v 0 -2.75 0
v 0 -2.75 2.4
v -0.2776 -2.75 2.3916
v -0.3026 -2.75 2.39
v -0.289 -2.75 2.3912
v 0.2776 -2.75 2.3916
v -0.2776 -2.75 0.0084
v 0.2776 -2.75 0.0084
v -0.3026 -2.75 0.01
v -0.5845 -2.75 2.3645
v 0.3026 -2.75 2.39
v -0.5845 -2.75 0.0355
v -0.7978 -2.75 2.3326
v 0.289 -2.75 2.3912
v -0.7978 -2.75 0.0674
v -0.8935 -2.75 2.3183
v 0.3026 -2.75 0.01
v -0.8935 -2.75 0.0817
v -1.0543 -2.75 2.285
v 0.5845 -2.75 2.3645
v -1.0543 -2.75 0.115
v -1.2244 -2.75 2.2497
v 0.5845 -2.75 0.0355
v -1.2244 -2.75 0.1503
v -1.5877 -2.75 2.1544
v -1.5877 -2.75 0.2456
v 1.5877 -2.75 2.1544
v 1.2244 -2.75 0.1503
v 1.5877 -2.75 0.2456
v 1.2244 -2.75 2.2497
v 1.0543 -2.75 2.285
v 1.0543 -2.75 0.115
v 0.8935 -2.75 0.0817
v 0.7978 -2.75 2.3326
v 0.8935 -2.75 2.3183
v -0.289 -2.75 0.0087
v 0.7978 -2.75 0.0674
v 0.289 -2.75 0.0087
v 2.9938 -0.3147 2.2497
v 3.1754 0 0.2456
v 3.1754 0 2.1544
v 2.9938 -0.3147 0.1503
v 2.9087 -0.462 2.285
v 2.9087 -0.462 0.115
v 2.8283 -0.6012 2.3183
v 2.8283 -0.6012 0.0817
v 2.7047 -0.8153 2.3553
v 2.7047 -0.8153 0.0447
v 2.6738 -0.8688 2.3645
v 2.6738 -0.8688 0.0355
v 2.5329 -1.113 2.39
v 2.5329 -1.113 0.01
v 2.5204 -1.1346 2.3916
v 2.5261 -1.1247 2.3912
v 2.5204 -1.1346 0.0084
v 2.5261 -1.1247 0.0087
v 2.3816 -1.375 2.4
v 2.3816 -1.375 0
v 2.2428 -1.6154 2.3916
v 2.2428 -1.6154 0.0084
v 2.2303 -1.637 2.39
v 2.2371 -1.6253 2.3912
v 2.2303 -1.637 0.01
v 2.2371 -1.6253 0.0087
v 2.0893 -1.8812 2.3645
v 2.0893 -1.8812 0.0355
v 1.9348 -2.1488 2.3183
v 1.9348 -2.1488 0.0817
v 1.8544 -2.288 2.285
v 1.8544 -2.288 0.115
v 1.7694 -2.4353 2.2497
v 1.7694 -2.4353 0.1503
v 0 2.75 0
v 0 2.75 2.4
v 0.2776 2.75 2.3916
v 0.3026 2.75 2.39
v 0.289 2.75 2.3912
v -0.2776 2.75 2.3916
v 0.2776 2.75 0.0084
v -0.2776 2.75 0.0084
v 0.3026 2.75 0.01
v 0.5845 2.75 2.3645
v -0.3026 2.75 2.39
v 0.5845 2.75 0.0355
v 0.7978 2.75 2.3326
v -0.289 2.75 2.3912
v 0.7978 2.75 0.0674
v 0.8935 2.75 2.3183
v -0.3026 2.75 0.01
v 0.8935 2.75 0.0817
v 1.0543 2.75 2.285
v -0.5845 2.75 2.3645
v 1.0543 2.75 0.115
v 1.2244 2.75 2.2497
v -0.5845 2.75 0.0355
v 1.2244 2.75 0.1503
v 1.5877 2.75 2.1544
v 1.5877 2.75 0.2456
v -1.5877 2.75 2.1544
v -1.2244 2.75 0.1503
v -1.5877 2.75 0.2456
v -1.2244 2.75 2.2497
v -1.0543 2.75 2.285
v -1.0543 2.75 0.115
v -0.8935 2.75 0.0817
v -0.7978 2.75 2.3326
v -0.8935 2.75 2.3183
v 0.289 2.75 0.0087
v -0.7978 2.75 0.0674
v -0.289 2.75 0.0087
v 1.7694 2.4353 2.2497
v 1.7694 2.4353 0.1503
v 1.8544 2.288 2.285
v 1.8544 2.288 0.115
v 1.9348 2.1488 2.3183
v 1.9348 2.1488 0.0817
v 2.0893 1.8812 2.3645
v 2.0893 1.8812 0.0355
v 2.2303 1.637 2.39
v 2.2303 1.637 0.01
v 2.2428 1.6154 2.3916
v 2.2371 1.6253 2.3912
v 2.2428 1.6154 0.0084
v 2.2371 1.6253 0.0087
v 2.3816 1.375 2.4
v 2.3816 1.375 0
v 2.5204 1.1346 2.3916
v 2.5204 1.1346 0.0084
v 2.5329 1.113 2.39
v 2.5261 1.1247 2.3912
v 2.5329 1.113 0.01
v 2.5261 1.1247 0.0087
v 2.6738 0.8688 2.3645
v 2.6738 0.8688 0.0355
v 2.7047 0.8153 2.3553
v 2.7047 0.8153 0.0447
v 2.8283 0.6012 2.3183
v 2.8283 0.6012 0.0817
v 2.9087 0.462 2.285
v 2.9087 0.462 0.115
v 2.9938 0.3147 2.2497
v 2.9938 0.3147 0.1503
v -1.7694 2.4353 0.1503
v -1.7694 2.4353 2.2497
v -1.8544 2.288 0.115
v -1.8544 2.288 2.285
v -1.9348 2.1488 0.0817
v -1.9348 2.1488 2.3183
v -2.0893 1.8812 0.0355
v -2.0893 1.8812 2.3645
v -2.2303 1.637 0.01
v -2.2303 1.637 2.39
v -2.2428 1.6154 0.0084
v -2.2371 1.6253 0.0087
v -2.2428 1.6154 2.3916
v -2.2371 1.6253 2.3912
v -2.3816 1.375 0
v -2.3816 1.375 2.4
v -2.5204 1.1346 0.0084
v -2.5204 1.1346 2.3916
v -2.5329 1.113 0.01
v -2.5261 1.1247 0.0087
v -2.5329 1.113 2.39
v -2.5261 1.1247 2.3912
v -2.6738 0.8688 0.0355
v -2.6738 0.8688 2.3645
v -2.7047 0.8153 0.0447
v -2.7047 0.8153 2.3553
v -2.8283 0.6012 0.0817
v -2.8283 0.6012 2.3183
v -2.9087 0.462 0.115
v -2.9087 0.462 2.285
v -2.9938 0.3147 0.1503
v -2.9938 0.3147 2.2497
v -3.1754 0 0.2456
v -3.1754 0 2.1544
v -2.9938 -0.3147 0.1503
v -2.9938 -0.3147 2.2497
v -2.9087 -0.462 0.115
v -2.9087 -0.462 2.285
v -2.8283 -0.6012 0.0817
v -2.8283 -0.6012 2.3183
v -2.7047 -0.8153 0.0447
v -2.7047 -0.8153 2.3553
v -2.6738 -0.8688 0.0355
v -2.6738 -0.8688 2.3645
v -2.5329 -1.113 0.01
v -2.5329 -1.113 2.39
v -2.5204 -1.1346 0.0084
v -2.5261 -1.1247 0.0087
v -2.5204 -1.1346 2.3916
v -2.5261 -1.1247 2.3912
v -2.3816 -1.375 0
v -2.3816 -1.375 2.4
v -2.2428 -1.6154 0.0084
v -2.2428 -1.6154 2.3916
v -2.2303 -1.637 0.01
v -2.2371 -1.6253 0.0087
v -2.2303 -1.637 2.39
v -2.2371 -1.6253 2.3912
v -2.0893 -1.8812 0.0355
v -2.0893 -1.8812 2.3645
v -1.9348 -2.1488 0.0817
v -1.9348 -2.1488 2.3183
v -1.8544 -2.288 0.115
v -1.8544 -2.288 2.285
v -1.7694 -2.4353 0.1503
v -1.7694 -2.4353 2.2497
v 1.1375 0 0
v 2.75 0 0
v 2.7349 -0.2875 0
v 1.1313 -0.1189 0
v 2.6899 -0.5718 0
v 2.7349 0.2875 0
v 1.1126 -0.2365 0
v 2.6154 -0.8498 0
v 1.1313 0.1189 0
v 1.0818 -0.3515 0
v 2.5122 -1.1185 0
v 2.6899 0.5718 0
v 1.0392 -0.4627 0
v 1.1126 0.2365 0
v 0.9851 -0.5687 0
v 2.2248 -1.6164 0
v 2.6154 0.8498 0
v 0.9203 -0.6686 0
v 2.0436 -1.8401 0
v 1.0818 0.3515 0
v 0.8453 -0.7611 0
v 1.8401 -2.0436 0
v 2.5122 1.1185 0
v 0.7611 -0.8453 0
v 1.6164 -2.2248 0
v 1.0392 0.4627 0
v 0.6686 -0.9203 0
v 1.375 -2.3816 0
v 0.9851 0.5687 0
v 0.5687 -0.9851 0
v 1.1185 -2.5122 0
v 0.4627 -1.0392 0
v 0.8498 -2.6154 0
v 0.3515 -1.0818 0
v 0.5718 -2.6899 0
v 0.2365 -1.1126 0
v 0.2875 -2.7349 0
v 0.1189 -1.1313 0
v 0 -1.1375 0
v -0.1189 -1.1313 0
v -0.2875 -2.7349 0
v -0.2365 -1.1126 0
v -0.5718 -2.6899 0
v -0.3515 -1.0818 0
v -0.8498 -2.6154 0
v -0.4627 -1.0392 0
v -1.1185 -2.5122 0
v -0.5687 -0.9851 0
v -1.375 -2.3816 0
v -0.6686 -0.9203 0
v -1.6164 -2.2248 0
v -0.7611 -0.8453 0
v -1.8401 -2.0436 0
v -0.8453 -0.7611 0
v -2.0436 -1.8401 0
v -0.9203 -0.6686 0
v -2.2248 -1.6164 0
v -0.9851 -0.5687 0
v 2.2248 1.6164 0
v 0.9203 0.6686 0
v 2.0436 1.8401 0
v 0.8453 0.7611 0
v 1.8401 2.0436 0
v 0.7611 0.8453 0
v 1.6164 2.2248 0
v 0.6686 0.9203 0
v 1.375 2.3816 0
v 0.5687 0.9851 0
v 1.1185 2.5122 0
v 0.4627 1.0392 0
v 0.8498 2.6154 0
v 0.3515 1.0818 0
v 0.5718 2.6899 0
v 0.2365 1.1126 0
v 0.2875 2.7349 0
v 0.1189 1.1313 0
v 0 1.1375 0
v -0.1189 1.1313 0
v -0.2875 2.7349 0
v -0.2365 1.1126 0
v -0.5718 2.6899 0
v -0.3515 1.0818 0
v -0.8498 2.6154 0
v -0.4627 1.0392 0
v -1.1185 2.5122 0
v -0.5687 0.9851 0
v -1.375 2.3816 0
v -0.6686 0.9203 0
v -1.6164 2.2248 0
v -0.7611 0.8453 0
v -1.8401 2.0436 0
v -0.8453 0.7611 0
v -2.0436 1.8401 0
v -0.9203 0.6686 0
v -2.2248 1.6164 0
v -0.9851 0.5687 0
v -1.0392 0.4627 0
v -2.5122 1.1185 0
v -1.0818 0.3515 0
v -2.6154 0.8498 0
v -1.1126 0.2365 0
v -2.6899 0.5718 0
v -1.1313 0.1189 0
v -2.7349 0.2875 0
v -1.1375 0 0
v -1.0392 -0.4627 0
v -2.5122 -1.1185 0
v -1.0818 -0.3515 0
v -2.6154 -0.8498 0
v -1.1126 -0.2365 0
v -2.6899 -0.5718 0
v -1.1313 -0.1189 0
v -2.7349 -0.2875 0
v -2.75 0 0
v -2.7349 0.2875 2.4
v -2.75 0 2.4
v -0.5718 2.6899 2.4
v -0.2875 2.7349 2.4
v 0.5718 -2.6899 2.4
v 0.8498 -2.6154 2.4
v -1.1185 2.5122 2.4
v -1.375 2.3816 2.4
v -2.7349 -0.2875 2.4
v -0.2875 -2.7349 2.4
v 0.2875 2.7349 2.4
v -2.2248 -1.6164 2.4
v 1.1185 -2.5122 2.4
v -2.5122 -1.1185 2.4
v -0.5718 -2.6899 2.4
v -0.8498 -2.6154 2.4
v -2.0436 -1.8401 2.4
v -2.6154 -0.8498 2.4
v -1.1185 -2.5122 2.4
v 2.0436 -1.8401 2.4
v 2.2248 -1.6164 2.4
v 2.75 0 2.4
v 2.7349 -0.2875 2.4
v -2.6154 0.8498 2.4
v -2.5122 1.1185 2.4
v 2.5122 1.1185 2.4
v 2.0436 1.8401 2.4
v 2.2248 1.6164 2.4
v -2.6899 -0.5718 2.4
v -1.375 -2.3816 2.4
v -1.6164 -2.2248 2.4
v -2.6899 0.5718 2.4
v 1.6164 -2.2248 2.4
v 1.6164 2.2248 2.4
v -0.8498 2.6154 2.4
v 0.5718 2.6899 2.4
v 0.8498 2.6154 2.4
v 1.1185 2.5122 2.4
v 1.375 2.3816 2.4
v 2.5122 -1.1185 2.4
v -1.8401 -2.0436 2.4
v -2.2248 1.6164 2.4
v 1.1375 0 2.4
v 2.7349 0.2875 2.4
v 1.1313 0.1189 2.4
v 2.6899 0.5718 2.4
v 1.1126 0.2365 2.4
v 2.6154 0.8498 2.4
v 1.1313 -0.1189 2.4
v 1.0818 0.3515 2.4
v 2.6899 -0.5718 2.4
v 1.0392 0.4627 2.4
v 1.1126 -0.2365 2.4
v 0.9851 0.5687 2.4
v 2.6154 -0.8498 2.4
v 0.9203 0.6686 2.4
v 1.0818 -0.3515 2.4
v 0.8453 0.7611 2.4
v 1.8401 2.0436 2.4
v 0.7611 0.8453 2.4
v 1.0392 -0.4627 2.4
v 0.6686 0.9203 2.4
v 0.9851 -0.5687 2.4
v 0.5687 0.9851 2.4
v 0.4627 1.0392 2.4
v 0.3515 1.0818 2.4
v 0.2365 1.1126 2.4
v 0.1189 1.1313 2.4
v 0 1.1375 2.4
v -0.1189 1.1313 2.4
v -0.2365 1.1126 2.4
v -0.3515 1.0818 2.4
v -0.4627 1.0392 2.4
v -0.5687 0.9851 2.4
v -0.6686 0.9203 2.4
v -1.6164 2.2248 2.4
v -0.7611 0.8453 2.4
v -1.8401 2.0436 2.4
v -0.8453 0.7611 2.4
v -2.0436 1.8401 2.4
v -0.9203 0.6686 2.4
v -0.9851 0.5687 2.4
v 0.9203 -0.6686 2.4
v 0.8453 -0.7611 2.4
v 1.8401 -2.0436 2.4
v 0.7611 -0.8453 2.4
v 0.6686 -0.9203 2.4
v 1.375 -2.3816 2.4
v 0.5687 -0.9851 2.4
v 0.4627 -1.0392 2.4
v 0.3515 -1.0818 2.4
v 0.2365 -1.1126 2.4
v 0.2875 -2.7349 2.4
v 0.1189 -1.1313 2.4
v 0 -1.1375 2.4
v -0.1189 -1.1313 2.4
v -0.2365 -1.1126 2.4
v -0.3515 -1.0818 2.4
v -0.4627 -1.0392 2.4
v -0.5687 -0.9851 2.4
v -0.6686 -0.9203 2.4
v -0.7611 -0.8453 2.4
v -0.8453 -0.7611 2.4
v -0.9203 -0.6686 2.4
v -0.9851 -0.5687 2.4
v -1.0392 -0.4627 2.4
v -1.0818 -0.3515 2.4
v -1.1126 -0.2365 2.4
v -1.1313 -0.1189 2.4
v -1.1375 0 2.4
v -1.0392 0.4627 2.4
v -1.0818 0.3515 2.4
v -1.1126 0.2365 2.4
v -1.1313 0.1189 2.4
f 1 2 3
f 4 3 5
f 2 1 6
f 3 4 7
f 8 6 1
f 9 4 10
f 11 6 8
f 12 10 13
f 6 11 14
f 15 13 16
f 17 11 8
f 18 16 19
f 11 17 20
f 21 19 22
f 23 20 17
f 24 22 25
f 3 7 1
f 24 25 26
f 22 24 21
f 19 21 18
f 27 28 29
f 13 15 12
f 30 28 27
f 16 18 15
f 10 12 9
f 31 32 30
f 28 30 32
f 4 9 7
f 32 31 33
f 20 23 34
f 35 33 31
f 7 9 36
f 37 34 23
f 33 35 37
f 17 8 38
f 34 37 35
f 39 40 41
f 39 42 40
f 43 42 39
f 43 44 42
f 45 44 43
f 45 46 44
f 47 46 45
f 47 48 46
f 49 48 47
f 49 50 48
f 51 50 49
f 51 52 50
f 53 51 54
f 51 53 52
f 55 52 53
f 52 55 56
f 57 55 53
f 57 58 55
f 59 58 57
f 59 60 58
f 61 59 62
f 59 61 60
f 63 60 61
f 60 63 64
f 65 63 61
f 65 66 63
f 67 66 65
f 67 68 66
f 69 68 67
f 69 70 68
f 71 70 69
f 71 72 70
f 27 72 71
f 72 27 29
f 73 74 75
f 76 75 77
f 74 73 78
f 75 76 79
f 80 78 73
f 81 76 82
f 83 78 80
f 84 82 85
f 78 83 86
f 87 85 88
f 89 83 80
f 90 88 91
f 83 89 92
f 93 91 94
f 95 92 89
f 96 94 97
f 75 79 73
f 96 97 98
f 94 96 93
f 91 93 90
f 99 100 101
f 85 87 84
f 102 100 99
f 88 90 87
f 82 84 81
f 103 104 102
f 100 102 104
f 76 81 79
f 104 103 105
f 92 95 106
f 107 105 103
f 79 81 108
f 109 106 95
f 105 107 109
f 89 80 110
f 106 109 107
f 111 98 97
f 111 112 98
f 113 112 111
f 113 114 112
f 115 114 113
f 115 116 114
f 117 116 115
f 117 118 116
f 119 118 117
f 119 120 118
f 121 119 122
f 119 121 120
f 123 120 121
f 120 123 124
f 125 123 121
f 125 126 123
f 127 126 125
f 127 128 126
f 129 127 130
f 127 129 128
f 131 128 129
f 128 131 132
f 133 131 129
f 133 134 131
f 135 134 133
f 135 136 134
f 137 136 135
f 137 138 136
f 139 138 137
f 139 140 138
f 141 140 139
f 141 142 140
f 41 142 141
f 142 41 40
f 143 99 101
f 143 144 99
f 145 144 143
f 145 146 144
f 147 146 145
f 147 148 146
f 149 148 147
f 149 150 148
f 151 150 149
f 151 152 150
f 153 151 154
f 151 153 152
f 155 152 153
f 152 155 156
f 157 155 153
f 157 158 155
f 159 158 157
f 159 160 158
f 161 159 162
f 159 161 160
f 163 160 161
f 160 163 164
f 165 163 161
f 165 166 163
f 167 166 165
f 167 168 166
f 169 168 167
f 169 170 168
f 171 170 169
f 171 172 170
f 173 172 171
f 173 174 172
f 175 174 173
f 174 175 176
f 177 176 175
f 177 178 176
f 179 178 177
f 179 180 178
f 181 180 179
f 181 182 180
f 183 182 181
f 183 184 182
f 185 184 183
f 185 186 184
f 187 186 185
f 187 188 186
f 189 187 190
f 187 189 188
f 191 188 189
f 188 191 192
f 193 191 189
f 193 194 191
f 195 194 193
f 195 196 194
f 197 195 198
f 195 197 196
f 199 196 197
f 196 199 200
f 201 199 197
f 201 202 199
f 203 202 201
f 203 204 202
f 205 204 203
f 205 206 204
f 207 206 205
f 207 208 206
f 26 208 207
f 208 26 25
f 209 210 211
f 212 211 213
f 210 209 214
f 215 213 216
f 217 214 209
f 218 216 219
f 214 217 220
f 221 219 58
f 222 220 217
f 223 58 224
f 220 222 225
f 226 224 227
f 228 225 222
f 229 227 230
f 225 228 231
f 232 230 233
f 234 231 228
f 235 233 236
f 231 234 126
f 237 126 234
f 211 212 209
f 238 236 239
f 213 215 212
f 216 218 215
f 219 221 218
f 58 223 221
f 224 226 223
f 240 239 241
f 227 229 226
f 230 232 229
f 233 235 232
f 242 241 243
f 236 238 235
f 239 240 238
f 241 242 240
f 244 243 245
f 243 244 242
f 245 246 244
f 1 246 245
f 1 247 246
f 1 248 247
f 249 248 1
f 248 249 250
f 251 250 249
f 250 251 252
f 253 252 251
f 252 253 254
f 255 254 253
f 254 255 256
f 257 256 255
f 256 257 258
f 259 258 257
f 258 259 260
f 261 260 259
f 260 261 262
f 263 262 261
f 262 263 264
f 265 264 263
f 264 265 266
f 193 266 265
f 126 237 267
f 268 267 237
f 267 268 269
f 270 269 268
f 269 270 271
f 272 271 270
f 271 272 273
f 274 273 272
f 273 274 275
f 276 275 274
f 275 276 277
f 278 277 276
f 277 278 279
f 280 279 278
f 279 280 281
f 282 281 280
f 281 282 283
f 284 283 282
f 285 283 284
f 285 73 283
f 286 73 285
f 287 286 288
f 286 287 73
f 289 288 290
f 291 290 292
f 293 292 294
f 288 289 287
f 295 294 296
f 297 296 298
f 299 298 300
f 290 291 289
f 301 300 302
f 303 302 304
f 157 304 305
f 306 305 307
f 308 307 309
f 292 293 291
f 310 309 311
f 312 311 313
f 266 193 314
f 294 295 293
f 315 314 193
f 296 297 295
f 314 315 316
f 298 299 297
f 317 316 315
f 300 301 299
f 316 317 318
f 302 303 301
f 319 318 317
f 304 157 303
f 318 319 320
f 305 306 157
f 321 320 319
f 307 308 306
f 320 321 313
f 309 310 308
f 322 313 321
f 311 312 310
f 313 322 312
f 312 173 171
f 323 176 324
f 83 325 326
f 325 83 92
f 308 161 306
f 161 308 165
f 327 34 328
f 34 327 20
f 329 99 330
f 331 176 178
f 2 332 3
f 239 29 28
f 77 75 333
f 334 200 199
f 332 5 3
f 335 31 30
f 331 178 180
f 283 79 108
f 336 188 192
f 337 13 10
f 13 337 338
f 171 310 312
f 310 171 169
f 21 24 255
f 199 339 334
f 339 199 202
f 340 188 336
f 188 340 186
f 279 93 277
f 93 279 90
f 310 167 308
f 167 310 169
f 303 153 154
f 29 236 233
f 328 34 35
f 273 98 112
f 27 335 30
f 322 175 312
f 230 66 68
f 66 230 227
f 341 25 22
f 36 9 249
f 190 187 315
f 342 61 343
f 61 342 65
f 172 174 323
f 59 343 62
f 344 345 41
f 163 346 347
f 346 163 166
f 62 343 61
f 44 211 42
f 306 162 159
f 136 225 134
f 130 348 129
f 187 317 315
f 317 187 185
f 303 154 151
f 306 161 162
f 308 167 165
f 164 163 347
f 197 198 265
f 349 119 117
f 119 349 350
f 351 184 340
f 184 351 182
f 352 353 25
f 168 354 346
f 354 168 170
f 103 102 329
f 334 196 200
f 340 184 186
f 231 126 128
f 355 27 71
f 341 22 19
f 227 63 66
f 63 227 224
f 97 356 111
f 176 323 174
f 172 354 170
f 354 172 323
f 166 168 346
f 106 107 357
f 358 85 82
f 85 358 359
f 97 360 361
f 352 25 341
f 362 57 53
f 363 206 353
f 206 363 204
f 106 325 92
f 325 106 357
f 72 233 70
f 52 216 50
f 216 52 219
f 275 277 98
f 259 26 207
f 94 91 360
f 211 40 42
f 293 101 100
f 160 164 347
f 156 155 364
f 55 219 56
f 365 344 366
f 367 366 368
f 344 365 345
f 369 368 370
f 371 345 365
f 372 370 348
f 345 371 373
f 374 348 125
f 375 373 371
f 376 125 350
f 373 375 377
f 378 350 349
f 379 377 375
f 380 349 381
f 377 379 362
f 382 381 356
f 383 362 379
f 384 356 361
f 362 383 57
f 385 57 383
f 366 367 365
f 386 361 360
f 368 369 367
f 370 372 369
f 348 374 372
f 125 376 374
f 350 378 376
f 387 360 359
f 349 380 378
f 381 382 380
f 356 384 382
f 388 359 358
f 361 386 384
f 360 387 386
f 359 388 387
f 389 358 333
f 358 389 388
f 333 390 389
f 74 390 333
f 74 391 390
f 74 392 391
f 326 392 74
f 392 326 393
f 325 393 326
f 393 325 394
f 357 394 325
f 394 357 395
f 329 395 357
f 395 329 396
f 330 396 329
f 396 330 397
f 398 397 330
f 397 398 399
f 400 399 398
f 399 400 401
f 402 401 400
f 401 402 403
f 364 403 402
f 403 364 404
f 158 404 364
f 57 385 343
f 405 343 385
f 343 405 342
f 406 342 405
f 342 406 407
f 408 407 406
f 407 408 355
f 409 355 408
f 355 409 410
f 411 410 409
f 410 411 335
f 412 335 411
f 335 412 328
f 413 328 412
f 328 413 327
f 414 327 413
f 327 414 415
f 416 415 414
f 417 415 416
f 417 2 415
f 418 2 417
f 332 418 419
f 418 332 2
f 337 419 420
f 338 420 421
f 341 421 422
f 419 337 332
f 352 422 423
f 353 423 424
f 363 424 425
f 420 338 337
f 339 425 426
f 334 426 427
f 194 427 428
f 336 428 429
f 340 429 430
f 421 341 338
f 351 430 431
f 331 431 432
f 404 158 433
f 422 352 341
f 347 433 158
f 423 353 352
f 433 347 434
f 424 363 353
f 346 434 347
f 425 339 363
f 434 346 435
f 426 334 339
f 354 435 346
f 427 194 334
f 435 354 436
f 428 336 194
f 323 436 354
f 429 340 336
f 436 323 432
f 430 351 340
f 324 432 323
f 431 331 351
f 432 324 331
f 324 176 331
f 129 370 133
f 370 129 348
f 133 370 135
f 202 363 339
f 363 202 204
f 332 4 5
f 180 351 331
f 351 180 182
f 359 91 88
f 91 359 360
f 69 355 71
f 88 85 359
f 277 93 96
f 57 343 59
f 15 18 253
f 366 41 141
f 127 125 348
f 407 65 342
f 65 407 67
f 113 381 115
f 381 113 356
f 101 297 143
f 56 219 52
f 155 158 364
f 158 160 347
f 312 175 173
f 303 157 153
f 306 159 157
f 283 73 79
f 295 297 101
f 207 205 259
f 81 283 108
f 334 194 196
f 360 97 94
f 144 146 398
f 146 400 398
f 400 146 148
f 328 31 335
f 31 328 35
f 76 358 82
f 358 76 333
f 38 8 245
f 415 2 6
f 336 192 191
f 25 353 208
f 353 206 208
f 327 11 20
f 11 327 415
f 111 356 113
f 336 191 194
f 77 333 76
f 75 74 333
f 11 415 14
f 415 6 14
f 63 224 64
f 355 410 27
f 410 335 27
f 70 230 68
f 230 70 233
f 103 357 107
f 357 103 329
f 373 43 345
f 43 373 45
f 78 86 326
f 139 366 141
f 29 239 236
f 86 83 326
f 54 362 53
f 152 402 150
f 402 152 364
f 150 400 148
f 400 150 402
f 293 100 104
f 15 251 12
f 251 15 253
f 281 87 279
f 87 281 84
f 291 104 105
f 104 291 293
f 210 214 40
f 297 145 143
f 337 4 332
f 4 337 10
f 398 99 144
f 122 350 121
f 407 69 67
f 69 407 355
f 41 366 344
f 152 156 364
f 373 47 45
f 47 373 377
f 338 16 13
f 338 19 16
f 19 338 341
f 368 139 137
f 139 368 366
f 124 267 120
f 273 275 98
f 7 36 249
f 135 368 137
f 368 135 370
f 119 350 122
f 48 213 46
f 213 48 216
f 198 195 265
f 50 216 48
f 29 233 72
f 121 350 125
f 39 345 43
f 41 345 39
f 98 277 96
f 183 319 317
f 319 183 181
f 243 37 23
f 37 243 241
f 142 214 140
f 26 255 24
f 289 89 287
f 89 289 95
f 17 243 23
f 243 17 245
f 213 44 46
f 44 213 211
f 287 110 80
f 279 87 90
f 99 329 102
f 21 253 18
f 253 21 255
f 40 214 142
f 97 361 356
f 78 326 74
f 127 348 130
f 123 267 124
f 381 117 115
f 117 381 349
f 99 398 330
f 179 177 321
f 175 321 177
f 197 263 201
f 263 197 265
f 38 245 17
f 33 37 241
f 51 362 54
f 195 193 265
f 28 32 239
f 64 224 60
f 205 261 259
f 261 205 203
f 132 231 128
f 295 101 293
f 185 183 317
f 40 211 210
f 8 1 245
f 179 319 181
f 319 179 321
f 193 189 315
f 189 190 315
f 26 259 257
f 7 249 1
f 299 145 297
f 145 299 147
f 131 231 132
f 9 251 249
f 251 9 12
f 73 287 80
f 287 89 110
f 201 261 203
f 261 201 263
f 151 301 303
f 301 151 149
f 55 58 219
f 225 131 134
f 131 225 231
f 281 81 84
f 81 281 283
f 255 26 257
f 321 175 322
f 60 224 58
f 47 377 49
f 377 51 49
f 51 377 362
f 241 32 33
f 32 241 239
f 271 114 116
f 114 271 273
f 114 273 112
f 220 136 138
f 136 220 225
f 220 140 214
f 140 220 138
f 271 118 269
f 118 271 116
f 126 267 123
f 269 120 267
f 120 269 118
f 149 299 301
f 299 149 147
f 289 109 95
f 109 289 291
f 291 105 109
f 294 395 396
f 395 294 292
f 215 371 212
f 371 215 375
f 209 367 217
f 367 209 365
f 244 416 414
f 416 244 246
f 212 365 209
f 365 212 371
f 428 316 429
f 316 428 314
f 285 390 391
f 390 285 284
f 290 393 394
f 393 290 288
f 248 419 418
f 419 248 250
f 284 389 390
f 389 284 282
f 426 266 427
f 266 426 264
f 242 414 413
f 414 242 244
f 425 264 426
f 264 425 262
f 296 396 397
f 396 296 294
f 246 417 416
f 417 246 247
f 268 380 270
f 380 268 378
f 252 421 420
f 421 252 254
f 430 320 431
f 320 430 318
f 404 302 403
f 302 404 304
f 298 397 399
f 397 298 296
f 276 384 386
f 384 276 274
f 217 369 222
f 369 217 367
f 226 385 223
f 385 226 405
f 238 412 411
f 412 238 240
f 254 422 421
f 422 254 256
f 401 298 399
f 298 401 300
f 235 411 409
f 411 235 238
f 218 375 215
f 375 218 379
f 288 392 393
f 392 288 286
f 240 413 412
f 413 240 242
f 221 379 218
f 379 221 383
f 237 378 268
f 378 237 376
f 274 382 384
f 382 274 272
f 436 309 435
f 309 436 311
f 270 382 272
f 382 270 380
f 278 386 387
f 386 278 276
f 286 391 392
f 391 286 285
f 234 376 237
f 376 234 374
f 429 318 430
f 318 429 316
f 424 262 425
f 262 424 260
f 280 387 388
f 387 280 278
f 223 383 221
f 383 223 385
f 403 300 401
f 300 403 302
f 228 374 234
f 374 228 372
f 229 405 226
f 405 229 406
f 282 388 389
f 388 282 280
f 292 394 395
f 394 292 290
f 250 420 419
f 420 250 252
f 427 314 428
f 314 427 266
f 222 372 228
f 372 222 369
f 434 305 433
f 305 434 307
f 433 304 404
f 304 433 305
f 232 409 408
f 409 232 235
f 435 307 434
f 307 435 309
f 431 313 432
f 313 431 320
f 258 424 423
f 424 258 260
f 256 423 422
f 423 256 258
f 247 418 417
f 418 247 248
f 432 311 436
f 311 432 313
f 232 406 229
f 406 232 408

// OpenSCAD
// Locker-Washer.scad
// Version: v0.01
// Description: Parametric locker washer for M3 bolts (tight fit)

/* [Washer Parameters] */
// Width across parallel flats (M3 standard is 5.5)
nut_flats = 5.5;
// Thickness of the washer (M3 standard is 2.4)
nut_thickness = 2.4;

/* [Thread Parameters] */
// Nominal bolt diameter (M3 = 3.0)
bolt_diameter = 3.0;
// Thread pitch (M3 standard = 0.5)
thread_pitch = 0.5;
// Clearance offset. Negative = tighter fit, Positive = looser fit.
// Default -0.1 creates a strong friction fit on most FDM printers.
thread_clearance = -0.1;

/* [Resolution] */
// Number of segments for the nut and threads
$fn = 60;

// Internal variables
epsilon = 0.05;

module locker_washer() {
    difference() {
        // Main hex nut body with chamfers
        nut_body(nut_flats, nut_thickness);

        // Subtract the threaded rod
        translate([0, 0, -epsilon])
            threaded_rod(
                diam = bolt_diameter + thread_clearance,
                pitch = thread_pitch,
                length = nut_thickness + 2*epsilon
            );
    }
}

module nut_body(flats, thickness) {
    r_in = flats / 2;
    r_out = flats / sqrt(3);
    chamfer_depth = (r_out - r_in) * tan(30);

    intersection() {
        // Hexagonal prism
        cylinder(r = r_out, h = thickness, $fn = 6);

        // Chamfered profile to trim the corners
        rotate_extrude($fn = $fn)
        polygon([
            [0, 0],
            [r_in, 0],
            [r_out, chamfer_depth],
            [r_out, thickness - chamfer_depth],
            [r_in, thickness],
            [0, thickness]
        ]);
    }
}

module threaded_rod(diam, pitch, length) {
    r_major = diam / 2;
    r_minor = r_major - pitch * 5 / 8;

    union() {
        // Central core hole
        cylinder(r = r_minor, h = length);

        // Thread spiral grooves
        thread_spiral(r_major, r_minor, pitch, length);
    }
}

module thread_spiral(r_major, r_minor, pitch, length) {
    facets = $fn > 0 ? $fn : 36;
    turns = length / pitch;
    steps = ceil(turns * facets);

    points = [
        for (i = [0 : steps])
            let (a = i * 360 / facets, z = i * pitch / facets)
            for (pt = [
                [r_minor * cos(a), r_minor * sin(a), z - pitch/2],
                [r_major * cos(a), r_major * sin(a), z - pitch/8],
                [r_major * cos(a), r_major * sin(a), z + pitch/8],
                [r_minor * cos(a), r_minor * sin(a), z + pitch/2]
            ]) pt
    ];

    faces_side = [
        for (i = [0 : steps-1])
            for (j = [0 : 3])
                for (t = [0 : 1])
                    let (
                        p1 = 4*i + j,
                        p2 = 4*i + (j+1)%4,
                        p3 = 4*(i+1) + (j+1)%4,
                        p4 = 4*(i+1) + j
                    )
                    t == 0 ? [p1, p2, p3] : [p1, p3, p4]
    ];

    N = 4 * steps;
    faces_caps = [
        [0, 3, 2], [0, 2, 1], // Bottom cap
        [N, N+1, N+2], [N, N+2, N+3] // Top cap
    ];

    polyhedron(points=points, faces=concat(faces_side, faces_caps), convexity=10);
}

// Generate the washer
locker_washer();
